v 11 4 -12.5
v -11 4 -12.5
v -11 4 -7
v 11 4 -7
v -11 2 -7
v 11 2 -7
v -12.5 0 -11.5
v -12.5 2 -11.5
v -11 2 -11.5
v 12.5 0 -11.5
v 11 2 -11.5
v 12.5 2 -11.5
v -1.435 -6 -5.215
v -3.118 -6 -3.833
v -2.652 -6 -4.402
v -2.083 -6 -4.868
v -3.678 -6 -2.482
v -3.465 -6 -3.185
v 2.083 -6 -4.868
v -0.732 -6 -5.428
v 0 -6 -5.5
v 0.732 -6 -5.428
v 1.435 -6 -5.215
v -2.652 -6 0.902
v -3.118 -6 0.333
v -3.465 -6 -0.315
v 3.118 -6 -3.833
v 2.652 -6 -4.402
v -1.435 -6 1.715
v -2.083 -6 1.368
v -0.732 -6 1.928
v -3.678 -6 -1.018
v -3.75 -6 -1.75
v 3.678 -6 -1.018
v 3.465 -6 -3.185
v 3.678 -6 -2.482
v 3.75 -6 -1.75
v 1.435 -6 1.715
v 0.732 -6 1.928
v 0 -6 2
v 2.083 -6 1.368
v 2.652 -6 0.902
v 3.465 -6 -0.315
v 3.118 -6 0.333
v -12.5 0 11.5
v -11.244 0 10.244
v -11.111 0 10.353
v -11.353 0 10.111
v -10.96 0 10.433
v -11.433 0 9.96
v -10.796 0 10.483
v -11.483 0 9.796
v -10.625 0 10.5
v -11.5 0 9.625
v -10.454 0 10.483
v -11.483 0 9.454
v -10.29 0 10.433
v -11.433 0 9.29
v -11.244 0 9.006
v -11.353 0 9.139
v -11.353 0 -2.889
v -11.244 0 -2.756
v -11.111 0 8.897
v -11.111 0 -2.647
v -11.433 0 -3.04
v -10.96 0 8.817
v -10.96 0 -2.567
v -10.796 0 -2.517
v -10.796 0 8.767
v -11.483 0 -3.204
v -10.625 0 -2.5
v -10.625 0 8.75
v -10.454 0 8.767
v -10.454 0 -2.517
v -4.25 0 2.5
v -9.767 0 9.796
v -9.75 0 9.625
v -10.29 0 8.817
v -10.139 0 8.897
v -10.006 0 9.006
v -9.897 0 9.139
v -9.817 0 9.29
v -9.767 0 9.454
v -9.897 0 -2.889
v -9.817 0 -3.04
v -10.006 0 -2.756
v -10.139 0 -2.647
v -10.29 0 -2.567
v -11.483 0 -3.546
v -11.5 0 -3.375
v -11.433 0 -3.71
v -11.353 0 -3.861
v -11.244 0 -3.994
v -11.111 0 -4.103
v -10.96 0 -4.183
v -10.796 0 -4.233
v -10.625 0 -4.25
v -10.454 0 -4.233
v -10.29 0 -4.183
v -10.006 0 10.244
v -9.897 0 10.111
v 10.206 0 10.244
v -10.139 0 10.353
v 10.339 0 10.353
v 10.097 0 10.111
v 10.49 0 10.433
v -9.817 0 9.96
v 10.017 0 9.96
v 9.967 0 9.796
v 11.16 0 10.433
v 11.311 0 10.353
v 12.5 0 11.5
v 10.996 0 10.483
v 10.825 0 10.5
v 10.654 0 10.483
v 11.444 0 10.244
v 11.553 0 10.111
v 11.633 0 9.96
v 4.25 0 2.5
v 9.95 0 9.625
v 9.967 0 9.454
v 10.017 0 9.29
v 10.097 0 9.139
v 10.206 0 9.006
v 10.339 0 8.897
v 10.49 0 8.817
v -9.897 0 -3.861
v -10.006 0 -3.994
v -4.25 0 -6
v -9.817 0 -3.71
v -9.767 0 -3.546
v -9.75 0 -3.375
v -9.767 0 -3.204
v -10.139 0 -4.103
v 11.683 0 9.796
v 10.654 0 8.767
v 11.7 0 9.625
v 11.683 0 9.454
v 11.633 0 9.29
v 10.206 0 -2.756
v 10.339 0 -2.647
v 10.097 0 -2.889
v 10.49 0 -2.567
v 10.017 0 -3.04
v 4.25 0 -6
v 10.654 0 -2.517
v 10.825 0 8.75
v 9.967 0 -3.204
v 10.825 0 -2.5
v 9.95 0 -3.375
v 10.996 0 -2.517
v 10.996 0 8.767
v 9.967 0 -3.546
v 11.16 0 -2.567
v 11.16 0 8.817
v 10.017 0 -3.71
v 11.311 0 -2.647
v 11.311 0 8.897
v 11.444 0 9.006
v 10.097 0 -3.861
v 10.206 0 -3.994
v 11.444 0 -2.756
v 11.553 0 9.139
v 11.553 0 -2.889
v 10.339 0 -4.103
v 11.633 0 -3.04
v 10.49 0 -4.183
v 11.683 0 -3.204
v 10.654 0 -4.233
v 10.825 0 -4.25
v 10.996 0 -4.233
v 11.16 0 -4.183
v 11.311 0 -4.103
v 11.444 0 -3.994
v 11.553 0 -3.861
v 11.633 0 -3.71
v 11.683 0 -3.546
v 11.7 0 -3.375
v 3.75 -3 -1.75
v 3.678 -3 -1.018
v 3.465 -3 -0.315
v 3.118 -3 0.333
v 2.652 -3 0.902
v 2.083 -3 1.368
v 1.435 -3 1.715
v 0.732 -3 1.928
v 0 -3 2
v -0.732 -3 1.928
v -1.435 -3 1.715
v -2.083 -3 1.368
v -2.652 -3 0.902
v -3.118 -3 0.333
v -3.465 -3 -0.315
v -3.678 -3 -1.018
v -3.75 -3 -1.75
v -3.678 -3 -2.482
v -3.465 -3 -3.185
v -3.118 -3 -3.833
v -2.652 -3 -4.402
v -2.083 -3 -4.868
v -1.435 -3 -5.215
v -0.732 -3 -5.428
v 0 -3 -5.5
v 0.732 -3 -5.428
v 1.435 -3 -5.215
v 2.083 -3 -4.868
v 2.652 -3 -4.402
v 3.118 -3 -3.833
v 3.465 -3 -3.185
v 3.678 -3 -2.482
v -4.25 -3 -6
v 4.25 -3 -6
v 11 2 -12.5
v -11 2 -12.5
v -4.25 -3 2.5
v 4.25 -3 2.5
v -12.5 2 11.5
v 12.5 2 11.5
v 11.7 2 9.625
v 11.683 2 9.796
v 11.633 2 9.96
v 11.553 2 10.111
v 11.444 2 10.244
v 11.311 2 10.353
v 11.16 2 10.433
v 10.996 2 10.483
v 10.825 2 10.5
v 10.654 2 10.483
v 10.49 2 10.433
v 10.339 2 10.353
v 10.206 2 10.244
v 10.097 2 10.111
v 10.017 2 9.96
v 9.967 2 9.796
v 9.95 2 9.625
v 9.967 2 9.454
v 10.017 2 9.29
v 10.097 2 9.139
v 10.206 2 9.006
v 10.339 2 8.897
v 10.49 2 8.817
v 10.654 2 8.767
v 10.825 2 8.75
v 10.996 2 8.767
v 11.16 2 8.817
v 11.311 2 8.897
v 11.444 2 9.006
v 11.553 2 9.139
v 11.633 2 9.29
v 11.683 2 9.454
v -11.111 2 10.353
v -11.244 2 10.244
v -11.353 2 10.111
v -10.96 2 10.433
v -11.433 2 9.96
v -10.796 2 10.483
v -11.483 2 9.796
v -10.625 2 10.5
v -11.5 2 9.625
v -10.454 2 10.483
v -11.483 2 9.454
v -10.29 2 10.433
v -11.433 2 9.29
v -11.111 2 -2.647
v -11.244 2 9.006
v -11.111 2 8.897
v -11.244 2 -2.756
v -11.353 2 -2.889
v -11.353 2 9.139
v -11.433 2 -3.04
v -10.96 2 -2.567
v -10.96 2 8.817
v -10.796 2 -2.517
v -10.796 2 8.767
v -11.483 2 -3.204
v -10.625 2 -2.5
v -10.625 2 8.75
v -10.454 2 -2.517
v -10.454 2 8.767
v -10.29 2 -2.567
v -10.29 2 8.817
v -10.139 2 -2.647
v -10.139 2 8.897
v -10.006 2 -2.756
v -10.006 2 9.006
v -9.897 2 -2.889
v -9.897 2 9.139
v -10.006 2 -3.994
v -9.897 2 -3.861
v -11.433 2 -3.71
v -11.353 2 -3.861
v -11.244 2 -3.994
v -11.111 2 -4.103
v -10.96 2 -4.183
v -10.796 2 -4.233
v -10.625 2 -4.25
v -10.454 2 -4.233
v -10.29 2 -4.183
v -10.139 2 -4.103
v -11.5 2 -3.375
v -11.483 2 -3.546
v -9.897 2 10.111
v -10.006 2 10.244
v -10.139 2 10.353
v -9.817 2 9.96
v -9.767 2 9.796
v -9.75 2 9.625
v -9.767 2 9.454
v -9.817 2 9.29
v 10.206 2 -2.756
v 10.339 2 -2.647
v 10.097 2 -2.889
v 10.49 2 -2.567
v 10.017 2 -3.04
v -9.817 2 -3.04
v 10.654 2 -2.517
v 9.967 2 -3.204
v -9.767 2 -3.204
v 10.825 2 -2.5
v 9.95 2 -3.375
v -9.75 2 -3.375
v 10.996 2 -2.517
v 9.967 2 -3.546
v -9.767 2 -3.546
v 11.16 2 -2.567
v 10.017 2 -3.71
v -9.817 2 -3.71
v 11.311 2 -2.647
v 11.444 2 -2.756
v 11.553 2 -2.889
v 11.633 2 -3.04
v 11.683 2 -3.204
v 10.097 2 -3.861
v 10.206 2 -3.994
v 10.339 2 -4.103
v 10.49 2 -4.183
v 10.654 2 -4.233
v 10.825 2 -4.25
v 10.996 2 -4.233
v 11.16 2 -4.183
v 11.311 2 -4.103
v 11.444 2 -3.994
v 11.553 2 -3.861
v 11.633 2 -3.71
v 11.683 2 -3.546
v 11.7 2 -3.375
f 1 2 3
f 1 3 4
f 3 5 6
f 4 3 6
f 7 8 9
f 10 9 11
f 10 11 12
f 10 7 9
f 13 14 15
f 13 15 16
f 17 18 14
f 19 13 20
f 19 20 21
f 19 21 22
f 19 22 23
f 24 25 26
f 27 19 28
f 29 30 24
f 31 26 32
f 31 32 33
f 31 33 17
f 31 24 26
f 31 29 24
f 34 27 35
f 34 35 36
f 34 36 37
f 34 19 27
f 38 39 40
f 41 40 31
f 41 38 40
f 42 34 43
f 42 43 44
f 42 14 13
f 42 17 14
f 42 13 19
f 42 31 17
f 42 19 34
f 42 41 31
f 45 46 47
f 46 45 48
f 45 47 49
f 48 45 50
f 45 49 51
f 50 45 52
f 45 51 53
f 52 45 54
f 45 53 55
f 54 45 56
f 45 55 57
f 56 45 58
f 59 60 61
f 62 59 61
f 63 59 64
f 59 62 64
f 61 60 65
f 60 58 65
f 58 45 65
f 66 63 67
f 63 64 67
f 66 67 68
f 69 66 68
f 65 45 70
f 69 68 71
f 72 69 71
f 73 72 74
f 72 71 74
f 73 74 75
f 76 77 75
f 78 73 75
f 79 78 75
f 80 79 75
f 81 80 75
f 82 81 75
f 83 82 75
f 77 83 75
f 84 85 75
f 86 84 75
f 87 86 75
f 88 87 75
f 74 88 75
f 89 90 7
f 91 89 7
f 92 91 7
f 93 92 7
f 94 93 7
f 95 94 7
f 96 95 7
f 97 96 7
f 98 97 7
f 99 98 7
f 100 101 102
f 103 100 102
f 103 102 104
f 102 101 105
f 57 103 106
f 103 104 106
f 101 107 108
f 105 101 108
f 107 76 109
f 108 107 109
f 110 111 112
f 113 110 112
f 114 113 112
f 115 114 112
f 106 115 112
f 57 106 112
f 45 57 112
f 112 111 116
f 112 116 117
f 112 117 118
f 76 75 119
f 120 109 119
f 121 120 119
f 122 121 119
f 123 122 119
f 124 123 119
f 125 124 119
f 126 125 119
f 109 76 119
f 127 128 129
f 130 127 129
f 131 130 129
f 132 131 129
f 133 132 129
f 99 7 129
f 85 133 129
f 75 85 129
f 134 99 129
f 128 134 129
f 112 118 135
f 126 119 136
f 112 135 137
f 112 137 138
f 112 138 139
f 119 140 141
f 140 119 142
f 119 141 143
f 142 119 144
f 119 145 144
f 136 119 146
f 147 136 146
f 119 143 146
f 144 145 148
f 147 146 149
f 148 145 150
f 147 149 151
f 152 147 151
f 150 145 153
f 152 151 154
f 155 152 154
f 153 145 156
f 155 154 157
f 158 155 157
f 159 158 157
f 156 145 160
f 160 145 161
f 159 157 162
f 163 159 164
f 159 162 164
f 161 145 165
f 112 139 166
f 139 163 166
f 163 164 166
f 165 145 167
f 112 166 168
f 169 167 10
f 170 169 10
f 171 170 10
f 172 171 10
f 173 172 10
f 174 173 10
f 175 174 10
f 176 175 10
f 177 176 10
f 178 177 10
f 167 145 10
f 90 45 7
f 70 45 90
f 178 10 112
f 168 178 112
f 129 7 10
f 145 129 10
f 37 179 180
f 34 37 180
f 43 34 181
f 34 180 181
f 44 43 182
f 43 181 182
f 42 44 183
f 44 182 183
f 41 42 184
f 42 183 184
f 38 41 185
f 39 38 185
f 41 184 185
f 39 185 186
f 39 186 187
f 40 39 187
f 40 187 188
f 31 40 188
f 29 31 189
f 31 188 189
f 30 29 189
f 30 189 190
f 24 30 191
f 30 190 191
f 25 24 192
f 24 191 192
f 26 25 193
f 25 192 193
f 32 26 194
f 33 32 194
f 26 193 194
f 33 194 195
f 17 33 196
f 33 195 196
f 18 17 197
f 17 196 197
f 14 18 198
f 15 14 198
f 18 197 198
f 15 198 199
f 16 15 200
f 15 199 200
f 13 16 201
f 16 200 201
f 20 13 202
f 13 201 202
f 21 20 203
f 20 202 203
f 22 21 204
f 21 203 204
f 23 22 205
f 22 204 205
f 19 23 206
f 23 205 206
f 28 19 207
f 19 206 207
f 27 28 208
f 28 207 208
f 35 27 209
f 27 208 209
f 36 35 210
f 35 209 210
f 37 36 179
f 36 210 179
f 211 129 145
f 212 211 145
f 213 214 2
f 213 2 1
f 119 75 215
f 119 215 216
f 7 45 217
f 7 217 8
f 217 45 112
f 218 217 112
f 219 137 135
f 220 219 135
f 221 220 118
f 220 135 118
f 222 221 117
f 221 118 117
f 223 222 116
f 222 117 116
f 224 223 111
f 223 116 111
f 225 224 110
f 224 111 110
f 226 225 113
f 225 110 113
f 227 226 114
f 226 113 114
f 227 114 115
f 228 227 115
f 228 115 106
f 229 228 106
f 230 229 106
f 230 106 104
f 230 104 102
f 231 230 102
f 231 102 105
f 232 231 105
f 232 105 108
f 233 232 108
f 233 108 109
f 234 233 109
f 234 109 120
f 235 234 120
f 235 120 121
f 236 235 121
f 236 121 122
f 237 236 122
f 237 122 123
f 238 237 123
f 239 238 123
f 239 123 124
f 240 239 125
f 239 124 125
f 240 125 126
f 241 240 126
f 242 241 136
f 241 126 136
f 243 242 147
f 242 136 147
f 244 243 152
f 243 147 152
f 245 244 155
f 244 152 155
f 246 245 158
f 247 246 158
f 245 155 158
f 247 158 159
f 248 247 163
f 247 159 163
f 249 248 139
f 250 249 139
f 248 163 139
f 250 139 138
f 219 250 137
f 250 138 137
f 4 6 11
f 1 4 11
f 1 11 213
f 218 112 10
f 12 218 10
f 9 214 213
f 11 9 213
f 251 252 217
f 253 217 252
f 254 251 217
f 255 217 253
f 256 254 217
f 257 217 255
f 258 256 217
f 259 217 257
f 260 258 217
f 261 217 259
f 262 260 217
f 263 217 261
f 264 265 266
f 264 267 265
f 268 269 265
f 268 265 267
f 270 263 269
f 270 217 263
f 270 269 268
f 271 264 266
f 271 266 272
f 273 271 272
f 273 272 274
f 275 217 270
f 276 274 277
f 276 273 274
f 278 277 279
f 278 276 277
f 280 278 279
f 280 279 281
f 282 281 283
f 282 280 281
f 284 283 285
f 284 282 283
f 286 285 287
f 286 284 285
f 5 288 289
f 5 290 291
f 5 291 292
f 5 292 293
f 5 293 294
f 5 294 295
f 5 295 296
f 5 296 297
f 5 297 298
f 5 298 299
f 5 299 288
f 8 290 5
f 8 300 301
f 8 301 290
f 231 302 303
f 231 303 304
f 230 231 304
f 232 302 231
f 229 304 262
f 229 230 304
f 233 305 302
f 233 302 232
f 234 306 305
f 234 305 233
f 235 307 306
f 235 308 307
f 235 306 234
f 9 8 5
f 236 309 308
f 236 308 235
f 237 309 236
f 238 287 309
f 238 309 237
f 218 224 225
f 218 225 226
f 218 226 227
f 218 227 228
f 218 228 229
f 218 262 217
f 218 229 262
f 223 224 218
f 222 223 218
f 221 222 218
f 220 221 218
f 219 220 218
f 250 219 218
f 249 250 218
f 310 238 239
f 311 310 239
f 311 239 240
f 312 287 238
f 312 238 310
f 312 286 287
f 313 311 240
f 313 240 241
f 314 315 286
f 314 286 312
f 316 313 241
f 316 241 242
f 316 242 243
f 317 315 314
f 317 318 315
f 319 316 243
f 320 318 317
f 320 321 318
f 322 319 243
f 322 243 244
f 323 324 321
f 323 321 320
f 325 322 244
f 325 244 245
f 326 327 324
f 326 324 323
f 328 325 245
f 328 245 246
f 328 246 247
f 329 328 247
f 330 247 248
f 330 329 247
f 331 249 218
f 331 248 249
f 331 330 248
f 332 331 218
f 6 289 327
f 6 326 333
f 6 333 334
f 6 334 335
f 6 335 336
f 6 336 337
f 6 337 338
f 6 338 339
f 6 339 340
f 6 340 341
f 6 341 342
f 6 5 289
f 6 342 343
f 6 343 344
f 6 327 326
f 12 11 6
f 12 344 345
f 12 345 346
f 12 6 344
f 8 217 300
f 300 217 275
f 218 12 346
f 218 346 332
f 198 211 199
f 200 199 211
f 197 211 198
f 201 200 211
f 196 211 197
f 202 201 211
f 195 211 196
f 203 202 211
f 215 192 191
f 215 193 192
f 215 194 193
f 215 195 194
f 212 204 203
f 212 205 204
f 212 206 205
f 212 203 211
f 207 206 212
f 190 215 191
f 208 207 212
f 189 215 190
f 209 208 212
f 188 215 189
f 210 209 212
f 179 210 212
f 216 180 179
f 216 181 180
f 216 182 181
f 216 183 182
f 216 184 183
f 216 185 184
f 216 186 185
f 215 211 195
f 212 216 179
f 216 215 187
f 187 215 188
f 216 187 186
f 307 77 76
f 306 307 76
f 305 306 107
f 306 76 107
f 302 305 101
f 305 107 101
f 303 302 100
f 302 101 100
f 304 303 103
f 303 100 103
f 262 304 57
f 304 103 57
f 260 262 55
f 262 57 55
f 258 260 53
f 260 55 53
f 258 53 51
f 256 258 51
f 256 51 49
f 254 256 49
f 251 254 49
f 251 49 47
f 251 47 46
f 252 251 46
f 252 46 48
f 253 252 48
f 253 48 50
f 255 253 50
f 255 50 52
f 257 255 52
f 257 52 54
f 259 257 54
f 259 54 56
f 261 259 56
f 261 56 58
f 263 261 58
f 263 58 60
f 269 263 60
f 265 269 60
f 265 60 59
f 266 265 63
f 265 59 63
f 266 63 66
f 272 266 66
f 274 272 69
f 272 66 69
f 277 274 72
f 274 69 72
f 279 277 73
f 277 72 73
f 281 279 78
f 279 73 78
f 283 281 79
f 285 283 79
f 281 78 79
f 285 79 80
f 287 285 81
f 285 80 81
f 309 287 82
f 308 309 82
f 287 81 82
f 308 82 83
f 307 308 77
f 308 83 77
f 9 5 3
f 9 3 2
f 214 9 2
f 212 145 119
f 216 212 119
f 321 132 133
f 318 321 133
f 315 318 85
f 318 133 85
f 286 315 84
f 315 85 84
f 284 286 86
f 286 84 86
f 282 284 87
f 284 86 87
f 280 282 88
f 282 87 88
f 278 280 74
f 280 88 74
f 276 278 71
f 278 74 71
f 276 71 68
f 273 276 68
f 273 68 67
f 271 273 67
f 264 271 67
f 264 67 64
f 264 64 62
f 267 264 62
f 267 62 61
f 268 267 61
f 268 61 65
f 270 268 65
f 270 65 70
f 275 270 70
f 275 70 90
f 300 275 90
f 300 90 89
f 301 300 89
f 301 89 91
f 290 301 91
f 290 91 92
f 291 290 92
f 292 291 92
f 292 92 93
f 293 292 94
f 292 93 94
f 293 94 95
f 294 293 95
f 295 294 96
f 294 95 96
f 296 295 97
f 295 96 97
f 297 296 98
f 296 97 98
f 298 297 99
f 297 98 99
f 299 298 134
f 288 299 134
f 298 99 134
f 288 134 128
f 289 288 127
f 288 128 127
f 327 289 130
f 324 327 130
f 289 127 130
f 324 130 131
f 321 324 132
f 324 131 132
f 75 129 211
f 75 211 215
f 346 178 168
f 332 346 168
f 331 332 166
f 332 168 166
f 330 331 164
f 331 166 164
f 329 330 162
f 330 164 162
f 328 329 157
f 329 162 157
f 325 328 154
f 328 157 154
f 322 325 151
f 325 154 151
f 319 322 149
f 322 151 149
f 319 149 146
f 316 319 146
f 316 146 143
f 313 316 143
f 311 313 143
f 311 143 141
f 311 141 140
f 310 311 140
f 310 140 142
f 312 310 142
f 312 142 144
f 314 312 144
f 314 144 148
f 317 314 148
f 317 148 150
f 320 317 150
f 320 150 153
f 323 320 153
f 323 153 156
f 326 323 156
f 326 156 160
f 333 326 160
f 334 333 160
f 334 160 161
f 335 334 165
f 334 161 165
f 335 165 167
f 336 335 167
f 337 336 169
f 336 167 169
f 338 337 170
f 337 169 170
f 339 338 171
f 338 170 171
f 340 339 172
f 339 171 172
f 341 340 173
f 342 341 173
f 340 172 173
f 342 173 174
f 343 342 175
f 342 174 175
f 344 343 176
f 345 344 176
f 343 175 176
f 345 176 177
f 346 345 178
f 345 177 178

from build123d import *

# Parameters (mm, degrees)
CROQUIS1_W              = 25
CROQUIS1_H              = 23
SALIENTE_EXTRUIR1_DEPTH = 2
CROQUIS2_W              = 8.5
CROQUIS2_H              = 8.5
SALIENTE_EXTRUIR2_DEPTH = 3
CROQUIS3_R              = 3.75
SALIENTE_EXTRUIR3_DEPTH = 3
CROQUIS4_R              = 0.875
CORTAR_EXTRUIR1_DEPTH   = 3
CROQUIS5_W              = 22
CROQUIS5_H              = 5.5
SALIENTE_EXTRUIR4_DEPTH = 2


with BuildPart() as part:
    # Croquis1 → Saliente-Extruir1 (new body)
    with BuildSketch(Plane(origin=(0, 0, 0), x_dir=(1, 0, 0), z_dir=(0, 1, 0))):
        Rectangle(CROQUIS1_W, CROQUIS1_H)
    extrude(amount=SALIENTE_EXTRUIR1_DEPTH)

    # Croquis2 → Saliente-Extruir2 (add)
    with BuildSketch(Plane.XZ):
        with Locations((0, -1.75)):
            Rectangle(CROQUIS2_W, CROQUIS2_H)
    extrude(amount=SALIENTE_EXTRUIR2_DEPTH)

    # Croquis3 → Saliente-Extruir3 (add)
    with BuildSketch(Plane.XZ.offset(3)):
        with Locations((0, -1.75)):
            Circle(CROQUIS3_R)
    extrude(amount=SALIENTE_EXTRUIR3_DEPTH)

    # Croquis4 → Cortar-Extruir1 (cut)
    with BuildSketch(Plane.XZ):
        with Locations((-10.625, 9.625)):
            Circle(CROQUIS4_R)
        with Locations((10.825, 9.625)):
            Circle(CROQUIS4_R)
        with Locations((10.825, -3.375)):
            Circle(CROQUIS4_R)
        with Locations((-10.625, -3.375)):
            Circle(CROQUIS4_R)
    extrude(amount=-CORTAR_EXTRUIR1_DEPTH, mode=Mode.SUBTRACT)

    # Croquis5 → Saliente-Extruir4 (add)
    with BuildSketch(Plane(origin=(0, 2, 0), x_dir=(1, 0, 0), z_dir=(0, 1, 0))):
        with Locations((0, 9.75)):
            Rectangle(CROQUIS5_W, CROQUIS5_H)
    extrude(amount=SALIENTE_EXTRUIR4_DEPTH)


solid = part.part
